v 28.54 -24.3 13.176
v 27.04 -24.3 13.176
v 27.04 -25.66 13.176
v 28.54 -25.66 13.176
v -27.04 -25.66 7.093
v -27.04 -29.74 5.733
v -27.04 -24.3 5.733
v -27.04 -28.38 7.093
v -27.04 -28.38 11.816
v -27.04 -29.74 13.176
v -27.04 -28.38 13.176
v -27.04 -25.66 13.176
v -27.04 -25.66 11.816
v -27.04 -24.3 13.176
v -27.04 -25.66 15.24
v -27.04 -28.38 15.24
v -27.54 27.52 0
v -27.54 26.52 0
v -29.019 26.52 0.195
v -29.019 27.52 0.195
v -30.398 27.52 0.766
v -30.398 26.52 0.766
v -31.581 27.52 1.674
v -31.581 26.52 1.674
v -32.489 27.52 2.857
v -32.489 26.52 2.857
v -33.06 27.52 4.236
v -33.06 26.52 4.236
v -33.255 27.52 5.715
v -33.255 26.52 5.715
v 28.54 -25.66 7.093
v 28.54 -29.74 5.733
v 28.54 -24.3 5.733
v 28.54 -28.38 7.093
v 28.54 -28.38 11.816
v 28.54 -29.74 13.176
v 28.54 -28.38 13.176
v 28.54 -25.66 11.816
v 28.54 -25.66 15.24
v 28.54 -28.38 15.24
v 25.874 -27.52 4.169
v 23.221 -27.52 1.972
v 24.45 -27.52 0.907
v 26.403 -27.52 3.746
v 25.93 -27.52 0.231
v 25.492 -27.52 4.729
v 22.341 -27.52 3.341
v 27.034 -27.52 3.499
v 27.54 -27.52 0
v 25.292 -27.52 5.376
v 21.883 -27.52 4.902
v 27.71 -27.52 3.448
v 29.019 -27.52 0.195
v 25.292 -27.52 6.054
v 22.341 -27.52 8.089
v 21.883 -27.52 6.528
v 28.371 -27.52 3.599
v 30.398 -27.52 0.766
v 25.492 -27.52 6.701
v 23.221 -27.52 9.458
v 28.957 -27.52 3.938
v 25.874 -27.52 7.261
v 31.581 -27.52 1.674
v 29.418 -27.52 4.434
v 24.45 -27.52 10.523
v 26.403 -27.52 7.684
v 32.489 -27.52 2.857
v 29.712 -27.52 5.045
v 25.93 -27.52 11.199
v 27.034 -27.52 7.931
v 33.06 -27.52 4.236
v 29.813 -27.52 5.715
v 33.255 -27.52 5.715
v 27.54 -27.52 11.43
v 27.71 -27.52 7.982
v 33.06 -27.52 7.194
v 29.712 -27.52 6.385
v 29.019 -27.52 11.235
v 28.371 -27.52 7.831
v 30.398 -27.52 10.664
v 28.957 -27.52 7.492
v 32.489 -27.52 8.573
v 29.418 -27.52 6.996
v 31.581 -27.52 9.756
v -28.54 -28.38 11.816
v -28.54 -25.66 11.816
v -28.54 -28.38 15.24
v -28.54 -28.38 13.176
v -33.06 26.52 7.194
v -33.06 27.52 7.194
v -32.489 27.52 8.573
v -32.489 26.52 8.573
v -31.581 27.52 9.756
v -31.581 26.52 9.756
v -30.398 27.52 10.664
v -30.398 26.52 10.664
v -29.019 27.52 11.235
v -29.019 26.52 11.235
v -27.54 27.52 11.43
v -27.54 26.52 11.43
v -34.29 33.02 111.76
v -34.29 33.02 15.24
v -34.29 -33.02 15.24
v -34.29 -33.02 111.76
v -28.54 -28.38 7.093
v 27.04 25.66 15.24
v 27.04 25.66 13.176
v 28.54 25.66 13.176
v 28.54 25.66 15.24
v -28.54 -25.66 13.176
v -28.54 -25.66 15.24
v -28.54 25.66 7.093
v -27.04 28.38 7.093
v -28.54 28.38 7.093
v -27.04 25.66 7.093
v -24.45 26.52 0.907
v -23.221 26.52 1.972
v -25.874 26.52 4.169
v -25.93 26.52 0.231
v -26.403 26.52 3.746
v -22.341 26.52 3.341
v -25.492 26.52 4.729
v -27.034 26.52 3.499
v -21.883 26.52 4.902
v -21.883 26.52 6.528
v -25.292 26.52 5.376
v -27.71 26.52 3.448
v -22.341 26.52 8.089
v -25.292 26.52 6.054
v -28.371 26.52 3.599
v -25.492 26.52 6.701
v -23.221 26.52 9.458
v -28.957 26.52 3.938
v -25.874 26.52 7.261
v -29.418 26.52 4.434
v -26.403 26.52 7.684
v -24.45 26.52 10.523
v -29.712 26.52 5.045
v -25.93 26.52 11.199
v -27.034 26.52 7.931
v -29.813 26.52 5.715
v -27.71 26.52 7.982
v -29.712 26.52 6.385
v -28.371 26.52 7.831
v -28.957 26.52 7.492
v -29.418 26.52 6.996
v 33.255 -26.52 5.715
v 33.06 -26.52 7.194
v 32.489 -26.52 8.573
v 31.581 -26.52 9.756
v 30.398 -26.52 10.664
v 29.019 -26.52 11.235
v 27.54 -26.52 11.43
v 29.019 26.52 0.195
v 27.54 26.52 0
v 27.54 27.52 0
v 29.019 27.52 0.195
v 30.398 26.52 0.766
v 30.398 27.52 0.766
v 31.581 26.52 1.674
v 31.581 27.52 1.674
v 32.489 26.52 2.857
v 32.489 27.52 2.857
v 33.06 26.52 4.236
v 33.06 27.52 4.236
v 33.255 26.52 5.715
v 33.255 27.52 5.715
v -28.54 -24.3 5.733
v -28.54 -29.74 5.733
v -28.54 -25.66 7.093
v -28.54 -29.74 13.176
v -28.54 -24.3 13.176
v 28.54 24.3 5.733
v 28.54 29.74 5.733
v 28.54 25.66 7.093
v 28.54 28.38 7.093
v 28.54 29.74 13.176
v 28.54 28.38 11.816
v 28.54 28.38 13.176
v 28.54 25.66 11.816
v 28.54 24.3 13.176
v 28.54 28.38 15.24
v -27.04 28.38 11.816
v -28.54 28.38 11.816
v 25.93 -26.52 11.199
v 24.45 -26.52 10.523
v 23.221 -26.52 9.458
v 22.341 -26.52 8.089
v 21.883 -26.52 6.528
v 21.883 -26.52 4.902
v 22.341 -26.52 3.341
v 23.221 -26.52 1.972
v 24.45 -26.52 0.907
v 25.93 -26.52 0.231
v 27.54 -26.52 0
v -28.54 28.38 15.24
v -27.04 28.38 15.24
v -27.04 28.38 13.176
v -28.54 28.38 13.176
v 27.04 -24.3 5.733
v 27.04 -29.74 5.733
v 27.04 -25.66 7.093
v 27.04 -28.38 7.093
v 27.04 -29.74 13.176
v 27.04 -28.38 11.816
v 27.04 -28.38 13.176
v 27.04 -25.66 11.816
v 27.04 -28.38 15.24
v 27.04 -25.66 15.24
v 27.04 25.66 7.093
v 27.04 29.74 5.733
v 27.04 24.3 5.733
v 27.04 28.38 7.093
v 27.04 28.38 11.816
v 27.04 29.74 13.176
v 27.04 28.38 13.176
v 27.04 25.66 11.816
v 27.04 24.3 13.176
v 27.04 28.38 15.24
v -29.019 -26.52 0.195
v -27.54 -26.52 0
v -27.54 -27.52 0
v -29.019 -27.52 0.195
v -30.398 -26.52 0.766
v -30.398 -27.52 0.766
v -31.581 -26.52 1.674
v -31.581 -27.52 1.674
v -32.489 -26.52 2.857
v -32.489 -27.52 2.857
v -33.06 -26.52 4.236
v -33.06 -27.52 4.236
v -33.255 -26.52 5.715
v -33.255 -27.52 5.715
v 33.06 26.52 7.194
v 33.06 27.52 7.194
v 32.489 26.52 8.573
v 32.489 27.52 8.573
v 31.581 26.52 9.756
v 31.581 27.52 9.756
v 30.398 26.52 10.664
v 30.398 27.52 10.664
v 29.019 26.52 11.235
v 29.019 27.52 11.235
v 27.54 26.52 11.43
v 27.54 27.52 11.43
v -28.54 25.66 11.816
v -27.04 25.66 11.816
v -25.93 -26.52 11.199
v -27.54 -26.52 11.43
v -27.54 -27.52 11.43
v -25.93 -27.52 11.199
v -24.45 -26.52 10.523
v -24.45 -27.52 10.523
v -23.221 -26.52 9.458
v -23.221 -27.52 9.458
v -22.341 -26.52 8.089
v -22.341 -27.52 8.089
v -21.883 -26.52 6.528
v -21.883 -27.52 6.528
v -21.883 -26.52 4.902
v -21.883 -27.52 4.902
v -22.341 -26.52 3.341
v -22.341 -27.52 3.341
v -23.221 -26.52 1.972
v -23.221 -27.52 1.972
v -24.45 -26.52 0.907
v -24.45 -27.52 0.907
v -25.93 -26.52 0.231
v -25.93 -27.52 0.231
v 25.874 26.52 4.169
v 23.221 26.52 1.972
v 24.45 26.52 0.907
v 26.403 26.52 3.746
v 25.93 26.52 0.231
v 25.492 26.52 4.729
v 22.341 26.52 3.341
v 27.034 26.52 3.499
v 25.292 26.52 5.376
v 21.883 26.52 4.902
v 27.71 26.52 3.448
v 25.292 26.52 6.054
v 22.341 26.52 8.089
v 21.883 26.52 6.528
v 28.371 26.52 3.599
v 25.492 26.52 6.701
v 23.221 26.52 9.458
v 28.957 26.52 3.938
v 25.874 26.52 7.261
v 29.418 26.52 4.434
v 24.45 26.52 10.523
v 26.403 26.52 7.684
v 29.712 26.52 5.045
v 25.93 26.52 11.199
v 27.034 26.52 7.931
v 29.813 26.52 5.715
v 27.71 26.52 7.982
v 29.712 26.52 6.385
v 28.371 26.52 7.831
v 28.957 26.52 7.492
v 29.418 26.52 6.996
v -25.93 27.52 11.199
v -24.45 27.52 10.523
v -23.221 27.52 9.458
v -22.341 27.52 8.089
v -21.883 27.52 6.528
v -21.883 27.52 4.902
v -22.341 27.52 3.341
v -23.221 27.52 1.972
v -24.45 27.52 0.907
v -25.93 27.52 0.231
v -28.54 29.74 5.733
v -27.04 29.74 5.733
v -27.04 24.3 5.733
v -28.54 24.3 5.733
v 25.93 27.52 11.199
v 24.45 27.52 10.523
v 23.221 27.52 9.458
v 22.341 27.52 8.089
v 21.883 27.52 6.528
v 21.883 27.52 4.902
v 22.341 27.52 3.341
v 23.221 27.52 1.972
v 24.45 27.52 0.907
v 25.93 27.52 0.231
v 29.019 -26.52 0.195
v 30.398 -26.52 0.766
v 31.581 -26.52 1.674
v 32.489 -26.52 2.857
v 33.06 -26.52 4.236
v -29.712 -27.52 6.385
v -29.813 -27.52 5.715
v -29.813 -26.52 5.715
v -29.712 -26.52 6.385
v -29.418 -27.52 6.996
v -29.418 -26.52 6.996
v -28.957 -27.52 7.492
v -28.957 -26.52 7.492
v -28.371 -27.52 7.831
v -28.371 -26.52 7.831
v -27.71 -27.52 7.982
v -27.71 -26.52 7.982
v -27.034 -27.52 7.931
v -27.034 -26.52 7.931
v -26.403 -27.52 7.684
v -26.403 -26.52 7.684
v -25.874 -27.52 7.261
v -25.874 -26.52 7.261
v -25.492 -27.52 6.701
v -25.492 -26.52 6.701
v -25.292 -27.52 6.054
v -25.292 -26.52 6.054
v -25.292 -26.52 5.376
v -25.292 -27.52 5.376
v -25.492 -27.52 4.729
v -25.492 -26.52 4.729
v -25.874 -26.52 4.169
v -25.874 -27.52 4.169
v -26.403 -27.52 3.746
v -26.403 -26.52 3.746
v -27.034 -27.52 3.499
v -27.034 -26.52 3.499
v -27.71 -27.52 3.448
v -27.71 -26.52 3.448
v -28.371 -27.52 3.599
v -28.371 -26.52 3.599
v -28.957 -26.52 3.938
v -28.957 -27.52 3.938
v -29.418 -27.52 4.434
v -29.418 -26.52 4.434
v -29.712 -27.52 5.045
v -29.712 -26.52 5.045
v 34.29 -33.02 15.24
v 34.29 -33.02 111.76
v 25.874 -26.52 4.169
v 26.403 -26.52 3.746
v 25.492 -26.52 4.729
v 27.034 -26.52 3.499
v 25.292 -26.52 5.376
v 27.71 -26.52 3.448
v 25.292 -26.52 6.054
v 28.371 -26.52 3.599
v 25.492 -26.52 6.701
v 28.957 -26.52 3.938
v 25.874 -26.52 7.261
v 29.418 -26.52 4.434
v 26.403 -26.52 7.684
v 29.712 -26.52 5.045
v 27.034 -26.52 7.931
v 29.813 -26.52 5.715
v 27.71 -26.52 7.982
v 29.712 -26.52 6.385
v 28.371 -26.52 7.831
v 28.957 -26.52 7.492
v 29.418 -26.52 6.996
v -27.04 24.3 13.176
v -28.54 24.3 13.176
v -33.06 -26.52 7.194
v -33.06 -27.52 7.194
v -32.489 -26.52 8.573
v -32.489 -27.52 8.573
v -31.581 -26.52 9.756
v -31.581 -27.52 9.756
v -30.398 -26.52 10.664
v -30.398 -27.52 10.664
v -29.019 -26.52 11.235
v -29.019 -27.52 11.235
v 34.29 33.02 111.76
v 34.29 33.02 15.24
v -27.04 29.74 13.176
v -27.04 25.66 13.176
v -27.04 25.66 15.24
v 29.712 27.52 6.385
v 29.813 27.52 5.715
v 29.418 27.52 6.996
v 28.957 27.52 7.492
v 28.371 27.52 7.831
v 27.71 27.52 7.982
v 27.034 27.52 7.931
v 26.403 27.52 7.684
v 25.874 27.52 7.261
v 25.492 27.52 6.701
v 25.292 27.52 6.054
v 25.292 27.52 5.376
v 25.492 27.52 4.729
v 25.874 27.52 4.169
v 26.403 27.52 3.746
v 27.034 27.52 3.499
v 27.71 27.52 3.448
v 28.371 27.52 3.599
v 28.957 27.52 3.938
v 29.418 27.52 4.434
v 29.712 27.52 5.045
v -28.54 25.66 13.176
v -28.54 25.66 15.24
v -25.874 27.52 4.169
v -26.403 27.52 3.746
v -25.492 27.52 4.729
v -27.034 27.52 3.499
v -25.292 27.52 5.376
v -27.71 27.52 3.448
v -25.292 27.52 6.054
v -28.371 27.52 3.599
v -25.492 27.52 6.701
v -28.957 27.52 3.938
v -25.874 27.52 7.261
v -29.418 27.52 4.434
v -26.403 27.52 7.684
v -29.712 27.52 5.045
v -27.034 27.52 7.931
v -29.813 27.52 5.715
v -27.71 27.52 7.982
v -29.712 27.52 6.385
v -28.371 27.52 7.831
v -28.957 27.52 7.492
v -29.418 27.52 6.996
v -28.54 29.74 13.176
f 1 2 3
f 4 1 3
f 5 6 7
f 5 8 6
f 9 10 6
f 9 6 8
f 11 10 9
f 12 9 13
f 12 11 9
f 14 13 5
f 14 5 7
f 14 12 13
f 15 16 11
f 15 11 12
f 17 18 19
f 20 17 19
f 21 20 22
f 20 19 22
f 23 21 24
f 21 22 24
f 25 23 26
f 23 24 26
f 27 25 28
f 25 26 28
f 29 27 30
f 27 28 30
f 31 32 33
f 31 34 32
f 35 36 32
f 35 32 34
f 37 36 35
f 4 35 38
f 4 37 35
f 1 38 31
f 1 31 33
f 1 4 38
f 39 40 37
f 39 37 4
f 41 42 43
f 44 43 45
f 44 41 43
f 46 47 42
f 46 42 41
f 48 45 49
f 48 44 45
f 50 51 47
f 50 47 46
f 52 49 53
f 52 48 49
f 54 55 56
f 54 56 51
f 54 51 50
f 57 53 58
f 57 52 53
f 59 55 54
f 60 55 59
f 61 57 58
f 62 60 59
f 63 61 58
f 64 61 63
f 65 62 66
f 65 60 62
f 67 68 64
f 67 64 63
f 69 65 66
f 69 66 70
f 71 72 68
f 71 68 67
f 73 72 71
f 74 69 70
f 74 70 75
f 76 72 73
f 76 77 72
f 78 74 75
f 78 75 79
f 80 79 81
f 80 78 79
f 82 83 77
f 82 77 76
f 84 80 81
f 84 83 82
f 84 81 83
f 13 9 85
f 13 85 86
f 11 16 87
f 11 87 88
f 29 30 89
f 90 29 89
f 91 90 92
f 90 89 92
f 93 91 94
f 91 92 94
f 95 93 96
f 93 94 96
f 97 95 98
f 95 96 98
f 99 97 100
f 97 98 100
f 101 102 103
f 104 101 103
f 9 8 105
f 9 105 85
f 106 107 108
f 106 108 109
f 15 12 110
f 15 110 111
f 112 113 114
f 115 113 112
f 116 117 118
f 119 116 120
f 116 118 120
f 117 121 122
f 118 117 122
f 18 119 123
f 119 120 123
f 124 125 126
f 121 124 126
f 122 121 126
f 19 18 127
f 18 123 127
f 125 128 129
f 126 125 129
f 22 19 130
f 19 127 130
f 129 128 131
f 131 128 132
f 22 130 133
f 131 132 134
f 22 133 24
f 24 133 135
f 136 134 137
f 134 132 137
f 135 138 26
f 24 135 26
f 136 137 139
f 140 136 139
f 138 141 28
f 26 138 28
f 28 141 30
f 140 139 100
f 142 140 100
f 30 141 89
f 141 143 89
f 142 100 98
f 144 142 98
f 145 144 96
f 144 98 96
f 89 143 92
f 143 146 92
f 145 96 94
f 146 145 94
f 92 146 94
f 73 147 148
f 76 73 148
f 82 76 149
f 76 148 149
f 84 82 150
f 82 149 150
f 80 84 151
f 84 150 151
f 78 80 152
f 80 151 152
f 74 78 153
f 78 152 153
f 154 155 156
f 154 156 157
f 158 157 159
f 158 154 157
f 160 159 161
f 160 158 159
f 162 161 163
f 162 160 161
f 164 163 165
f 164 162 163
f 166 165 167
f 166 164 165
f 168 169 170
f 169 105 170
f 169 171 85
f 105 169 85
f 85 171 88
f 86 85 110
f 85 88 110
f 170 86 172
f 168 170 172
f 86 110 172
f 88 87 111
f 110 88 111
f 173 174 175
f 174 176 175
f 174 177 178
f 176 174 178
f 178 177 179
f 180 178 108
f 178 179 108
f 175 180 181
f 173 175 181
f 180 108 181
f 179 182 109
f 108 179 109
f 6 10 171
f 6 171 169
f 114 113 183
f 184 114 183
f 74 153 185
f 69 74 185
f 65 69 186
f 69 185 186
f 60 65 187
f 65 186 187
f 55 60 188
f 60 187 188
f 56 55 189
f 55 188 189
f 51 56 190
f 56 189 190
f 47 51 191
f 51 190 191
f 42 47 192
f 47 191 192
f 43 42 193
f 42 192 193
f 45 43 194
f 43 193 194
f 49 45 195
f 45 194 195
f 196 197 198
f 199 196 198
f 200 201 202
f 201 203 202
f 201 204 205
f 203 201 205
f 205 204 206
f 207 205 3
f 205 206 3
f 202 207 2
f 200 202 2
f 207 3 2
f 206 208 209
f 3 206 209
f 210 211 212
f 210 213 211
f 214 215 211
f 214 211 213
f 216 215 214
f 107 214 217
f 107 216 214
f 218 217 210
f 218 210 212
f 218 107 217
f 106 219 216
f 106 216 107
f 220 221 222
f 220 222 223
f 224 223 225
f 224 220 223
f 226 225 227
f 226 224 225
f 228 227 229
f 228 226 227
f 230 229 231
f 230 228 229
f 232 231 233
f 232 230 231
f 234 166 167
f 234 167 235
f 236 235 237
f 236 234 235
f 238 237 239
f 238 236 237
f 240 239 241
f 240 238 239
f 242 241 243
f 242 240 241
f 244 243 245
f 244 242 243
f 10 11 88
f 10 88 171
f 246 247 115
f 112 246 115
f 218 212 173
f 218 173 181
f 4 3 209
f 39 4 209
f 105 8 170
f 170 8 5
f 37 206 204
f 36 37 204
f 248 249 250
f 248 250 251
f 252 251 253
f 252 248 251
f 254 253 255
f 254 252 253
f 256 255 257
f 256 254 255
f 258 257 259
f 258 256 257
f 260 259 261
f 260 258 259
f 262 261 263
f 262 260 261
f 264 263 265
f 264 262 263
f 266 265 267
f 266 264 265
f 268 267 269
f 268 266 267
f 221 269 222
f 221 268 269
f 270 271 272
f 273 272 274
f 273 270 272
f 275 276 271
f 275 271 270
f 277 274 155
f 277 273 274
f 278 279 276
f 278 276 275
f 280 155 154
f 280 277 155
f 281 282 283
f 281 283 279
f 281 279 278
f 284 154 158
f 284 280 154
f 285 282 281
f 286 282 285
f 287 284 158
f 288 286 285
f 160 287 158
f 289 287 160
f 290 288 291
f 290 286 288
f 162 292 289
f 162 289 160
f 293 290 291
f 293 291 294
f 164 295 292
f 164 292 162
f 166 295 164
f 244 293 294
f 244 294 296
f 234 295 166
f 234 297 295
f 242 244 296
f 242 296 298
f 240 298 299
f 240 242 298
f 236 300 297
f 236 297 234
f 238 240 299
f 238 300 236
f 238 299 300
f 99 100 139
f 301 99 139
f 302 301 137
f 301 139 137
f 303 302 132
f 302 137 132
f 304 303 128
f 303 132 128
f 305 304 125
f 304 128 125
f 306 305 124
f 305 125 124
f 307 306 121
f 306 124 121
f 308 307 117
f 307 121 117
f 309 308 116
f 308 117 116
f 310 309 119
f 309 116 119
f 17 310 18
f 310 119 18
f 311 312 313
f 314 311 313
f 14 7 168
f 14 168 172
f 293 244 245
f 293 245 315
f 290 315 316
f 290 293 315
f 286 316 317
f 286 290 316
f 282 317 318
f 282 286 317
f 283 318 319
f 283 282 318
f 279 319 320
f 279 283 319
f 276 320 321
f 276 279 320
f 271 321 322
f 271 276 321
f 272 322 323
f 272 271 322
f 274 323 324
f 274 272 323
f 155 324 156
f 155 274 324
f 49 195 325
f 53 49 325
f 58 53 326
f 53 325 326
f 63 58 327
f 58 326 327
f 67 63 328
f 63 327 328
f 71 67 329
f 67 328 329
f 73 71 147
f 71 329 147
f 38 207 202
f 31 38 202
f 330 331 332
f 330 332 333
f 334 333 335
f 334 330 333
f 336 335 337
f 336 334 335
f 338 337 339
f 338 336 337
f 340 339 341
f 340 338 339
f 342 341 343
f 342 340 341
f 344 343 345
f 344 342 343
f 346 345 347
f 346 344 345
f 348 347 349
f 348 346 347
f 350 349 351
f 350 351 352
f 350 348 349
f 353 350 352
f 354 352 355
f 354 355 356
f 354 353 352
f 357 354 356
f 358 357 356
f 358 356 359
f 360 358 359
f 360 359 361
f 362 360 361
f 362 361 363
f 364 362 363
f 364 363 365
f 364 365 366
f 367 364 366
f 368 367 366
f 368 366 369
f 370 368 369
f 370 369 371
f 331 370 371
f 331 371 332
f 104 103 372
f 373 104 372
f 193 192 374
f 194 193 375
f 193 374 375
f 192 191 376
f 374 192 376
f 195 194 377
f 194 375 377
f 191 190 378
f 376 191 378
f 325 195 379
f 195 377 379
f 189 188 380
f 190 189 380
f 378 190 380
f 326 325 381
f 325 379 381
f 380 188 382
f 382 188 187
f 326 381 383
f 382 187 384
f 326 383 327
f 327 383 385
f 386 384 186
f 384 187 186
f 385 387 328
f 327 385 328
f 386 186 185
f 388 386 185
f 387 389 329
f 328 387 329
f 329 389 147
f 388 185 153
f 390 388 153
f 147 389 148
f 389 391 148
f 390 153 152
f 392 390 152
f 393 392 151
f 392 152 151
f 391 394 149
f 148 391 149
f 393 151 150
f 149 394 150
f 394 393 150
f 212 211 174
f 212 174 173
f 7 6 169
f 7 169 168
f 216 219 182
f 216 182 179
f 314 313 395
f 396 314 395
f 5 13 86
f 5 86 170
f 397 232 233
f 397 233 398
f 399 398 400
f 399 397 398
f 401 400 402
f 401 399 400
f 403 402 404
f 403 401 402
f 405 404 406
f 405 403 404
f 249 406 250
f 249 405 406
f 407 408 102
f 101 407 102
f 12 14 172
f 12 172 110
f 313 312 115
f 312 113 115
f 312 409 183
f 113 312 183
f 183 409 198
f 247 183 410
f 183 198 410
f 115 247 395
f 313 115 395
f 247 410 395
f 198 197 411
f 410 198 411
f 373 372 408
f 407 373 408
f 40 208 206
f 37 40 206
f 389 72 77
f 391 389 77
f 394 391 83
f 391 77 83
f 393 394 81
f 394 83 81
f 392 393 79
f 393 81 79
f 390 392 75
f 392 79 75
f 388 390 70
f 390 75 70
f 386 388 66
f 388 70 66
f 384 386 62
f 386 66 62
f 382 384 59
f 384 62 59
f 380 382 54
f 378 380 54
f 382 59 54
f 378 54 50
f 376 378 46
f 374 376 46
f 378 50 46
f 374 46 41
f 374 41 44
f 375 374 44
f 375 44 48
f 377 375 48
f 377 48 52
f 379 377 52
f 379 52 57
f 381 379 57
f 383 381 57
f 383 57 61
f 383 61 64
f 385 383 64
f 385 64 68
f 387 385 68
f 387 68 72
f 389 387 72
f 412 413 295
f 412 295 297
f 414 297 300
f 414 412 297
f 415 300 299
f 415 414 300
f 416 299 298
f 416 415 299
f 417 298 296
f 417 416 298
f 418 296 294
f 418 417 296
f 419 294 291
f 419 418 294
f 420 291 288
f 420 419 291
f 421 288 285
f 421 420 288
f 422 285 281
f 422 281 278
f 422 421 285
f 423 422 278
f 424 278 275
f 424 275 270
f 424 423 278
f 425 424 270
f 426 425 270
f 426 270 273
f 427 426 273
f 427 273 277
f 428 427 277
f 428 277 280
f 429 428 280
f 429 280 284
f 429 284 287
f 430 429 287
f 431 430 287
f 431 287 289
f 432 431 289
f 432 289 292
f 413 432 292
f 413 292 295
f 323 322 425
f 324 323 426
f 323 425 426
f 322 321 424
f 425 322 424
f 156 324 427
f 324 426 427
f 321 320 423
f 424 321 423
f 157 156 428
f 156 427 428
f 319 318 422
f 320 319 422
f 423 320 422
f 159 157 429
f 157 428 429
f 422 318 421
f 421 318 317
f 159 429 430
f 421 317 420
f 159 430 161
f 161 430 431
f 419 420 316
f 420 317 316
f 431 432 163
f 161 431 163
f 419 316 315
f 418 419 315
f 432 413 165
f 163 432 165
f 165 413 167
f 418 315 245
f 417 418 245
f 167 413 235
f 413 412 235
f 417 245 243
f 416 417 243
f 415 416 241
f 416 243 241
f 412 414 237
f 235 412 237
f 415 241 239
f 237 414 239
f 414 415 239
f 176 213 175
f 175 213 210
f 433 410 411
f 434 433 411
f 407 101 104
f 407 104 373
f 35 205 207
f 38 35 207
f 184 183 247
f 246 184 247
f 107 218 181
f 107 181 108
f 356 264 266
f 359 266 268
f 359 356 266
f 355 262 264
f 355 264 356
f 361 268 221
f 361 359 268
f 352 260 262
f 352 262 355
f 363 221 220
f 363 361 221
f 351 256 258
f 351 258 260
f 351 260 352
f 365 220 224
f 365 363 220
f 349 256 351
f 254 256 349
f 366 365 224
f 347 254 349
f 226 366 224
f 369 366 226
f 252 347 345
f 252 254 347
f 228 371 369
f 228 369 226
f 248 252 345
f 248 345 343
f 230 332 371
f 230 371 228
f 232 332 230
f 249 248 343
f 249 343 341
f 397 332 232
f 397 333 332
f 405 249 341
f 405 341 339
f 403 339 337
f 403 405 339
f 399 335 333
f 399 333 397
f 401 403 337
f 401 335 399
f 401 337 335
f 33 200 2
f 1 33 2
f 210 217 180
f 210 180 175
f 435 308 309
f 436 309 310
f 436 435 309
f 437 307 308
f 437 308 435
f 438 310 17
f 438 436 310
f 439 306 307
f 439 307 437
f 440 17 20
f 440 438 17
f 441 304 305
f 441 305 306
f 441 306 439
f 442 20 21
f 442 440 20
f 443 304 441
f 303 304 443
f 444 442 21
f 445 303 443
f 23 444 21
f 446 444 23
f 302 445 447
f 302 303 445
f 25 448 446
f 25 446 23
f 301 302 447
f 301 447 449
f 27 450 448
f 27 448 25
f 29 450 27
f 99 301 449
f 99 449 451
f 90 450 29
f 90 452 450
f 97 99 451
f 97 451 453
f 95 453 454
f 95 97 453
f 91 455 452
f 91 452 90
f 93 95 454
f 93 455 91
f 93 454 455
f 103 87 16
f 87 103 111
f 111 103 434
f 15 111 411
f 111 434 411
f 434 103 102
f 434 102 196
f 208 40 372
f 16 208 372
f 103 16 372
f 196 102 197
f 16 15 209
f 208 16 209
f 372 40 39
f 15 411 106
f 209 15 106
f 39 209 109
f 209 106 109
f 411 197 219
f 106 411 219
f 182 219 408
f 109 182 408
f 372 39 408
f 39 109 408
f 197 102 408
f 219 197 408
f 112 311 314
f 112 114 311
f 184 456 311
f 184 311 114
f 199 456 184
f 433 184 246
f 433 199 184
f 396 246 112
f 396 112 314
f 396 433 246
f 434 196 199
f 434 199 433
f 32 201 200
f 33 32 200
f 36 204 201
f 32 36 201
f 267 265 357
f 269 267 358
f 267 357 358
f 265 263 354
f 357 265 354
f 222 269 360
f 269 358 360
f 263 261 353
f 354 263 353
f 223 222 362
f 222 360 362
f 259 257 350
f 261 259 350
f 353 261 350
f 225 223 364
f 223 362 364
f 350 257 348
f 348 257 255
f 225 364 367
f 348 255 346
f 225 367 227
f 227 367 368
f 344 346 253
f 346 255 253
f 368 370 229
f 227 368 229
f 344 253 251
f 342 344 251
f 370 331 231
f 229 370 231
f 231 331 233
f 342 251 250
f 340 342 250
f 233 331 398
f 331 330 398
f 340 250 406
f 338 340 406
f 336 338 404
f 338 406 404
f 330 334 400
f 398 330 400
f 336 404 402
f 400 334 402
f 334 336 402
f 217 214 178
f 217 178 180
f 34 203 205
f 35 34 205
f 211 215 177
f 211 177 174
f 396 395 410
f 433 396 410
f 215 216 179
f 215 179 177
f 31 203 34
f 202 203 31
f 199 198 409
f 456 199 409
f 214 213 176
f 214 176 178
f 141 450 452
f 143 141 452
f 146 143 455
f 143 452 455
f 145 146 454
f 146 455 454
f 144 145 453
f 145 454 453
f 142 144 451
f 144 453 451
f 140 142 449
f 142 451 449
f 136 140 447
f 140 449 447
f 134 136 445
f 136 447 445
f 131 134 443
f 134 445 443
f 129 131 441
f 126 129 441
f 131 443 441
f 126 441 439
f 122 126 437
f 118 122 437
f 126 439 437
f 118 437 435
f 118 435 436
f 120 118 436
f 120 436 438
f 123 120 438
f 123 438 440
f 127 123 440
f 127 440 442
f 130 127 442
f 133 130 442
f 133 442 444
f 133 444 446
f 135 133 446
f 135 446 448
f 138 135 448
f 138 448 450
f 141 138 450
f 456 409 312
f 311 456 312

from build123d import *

# Parameters (mm, degrees)
F1_START  = 15.24
F0_W      = 13.5
F0_H      = 13
F1_DEPTH  = 96.52
F2_DEPTH  = 25
F4_START  = 6.5
F4_DEPTH  = 1
F5_R      = 2.2732854871
F6_DEPTH  = 25
F10_START = 6.25
F9_W      = 2.72
F9_H      = 1.36
F10_DEPTH = 1.5
F13_W     = 41.58
F13_H     = 15.24
F14_DEPTH = 100
F15_W     = 40.04
F15_H     = 15.24
F16_DEPTH = 100


with BuildPart() as f1:
    # F0 (on Top) → F1 (new body)
    with BuildSketch(Plane.XY.offset(F1_START)):
        Polygon((-20.79, -20.02), (-20.79, -33.02), (20.79, -33.02), (20.79, -20.02), (34.29, -20.02), (34.29, 20.02), (20.79, 20.02), (20.79, 33.02), (-20.79, 33.02), (-20.79, 20.02), (-34.29, 20.02), (-34.29, -20.02), align=None)
        with Locations((-27.54, -26.52)):
            Rectangle(F0_W, F0_H)
        with Locations((-27.54, 26.52)):
            Rectangle(F0_W, F0_H)
        with Locations((27.54, -26.52)):
            Rectangle(F0_W, F0_H)
        with Locations((27.54, 26.52)):
            Rectangle(F0_W, F0_H)
    extrude(amount=F1_DEPTH)

    # F0 (on Top) → F2 (join)
    with BuildSketch(Plane.XY):
        Polygon((-20.79, -20.02), (-20.79, -33.02), (20.79, -33.02), (20.79, -20.02), (34.29, -20.02), (34.29, 20.02), (20.79, 20.02), (20.79, 33.02), (-20.79, 33.02), (-20.79, 20.02), (-34.29, 20.02), (-34.29, -20.02), align=None)
    extrude(amount=F2_DEPTH)


with BuildPart() as f4:
    # F3 (on face) → F4 (new body)
    with BuildSketch(Plane(origin=(0, 20.02, 0), x_dir=(-1, 0, 0), z_dir=(0, 1, 0)).offset(F4_START)):
        with BuildLine():
            Line((27.54, 0), (27.54, 11.43))
            ThreePointArc((27.54, 11.43), (21.825, 5.715), (27.54, 0))
        make_face()
        with BuildLine():
            ThreePointArc((27.54, 0), (31.5811152545, 1.6738847455), (33.255, 5.715))
            ThreePointArc((33.255, 5.715), (31.5811152545, 9.7561152545), (27.54, 11.43))
            Line((27.54, 11.43), (27.54, 0))
        make_face()
    extrude(amount=F4_DEPTH)


with BuildPart() as f6_tool:
    # F5 (on face) → F6 (new body)
    with BuildSketch(Plane(origin=(0, 27.52, 0), x_dir=(-1, 0, 0), z_dir=(0, 1, 0))):
        with Locations((27.54, 5.715)):
            Circle(F5_R)
    extrude(amount=-F6_DEPTH)


with BuildPart() as f1_1:
    add(f1.part)

    # F6: cut by f6_tool
    add(f6_tool.part, mode=Mode.SUBTRACT)

    # F9 (on face) → F10 (join)
    with BuildSketch(Plane(origin=(-20.79, 0, 0), x_dir=(0, -1, 0), z_dir=(-1, 0, 0)).offset(F10_START)):
        Polygon((-25.66, 15.24), (-27.02, 15.24), (-27.02, 13.1759335107), (-27.02, 11.8159335107), (-25.66, 11.8159335107), (-25.66, 7.0929335107), (-25.66, 5.7329335107), (-24.3, 5.7329335107), (-24.3, 13.1759335107), (-25.66, 13.1759335107), align=None)
        Polygon((-27.02, 13.1759335107), (-27.02, 15.24), (-28.38, 15.24), (-28.38, 13.1759335107), (-29.74, 13.1759335107), (-29.74, 5.7329335107), (-28.38, 5.7329335107), (-28.38, 7.0929335107), (-28.38, 11.8159335107), (-27.02, 11.8159335107), align=None)
        with Locations((-27.02, 6.4129335107)):
            Rectangle(F9_W, F9_H)
    extrude(amount=F10_DEPTH)

    # F11: F1 across plane


with BuildPart() as f4_1:
    add(f4.part)

    # F6: cut by f6_tool
    add(f6_tool.part, mode=Mode.SUBTRACT)


with BuildPart() as f7_1:
    # F7: instance of F4
    add(f4_1.part.mirror(Plane.YZ))


with BuildPart() as f8_1:
    # F8: instance of F7_1
    add(f7_1.part.mirror(Plane.XZ))


with BuildPart() as f8_2:
    # F8: instance of F4
    add(f4_1.part.mirror(Plane.XZ))


with BuildPart() as f1_2:
    add(f1_1.part)
    add(f1_1.part.mirror(Plane.XZ))

    # F12: F1 across plane


with BuildPart() as f1_3:
    add(f1_2.part)
    add(f1_2.part.mirror(Plane.YZ))

    # F13 (on face) → F14 (cut)
    with BuildSketch(Plane.XZ.offset(33.02)):
        with Locations((0, 7.62)):
            Rectangle(F13_W, F13_H)
    extrude(amount=-F14_DEPTH, mode=Mode.SUBTRACT)

    # F15 (on face) → F16 (cut)
    with BuildSketch(Plane.YZ.offset(34.29)):
        with Locations((0, 7.62)):
            Rectangle(F15_W, F15_H)
    extrude(amount=-F16_DEPTH, mode=Mode.SUBTRACT)


solid = Compound([f4_1.part, f7_1.part, f8_1.part, f8_2.part, f1_3.part])
